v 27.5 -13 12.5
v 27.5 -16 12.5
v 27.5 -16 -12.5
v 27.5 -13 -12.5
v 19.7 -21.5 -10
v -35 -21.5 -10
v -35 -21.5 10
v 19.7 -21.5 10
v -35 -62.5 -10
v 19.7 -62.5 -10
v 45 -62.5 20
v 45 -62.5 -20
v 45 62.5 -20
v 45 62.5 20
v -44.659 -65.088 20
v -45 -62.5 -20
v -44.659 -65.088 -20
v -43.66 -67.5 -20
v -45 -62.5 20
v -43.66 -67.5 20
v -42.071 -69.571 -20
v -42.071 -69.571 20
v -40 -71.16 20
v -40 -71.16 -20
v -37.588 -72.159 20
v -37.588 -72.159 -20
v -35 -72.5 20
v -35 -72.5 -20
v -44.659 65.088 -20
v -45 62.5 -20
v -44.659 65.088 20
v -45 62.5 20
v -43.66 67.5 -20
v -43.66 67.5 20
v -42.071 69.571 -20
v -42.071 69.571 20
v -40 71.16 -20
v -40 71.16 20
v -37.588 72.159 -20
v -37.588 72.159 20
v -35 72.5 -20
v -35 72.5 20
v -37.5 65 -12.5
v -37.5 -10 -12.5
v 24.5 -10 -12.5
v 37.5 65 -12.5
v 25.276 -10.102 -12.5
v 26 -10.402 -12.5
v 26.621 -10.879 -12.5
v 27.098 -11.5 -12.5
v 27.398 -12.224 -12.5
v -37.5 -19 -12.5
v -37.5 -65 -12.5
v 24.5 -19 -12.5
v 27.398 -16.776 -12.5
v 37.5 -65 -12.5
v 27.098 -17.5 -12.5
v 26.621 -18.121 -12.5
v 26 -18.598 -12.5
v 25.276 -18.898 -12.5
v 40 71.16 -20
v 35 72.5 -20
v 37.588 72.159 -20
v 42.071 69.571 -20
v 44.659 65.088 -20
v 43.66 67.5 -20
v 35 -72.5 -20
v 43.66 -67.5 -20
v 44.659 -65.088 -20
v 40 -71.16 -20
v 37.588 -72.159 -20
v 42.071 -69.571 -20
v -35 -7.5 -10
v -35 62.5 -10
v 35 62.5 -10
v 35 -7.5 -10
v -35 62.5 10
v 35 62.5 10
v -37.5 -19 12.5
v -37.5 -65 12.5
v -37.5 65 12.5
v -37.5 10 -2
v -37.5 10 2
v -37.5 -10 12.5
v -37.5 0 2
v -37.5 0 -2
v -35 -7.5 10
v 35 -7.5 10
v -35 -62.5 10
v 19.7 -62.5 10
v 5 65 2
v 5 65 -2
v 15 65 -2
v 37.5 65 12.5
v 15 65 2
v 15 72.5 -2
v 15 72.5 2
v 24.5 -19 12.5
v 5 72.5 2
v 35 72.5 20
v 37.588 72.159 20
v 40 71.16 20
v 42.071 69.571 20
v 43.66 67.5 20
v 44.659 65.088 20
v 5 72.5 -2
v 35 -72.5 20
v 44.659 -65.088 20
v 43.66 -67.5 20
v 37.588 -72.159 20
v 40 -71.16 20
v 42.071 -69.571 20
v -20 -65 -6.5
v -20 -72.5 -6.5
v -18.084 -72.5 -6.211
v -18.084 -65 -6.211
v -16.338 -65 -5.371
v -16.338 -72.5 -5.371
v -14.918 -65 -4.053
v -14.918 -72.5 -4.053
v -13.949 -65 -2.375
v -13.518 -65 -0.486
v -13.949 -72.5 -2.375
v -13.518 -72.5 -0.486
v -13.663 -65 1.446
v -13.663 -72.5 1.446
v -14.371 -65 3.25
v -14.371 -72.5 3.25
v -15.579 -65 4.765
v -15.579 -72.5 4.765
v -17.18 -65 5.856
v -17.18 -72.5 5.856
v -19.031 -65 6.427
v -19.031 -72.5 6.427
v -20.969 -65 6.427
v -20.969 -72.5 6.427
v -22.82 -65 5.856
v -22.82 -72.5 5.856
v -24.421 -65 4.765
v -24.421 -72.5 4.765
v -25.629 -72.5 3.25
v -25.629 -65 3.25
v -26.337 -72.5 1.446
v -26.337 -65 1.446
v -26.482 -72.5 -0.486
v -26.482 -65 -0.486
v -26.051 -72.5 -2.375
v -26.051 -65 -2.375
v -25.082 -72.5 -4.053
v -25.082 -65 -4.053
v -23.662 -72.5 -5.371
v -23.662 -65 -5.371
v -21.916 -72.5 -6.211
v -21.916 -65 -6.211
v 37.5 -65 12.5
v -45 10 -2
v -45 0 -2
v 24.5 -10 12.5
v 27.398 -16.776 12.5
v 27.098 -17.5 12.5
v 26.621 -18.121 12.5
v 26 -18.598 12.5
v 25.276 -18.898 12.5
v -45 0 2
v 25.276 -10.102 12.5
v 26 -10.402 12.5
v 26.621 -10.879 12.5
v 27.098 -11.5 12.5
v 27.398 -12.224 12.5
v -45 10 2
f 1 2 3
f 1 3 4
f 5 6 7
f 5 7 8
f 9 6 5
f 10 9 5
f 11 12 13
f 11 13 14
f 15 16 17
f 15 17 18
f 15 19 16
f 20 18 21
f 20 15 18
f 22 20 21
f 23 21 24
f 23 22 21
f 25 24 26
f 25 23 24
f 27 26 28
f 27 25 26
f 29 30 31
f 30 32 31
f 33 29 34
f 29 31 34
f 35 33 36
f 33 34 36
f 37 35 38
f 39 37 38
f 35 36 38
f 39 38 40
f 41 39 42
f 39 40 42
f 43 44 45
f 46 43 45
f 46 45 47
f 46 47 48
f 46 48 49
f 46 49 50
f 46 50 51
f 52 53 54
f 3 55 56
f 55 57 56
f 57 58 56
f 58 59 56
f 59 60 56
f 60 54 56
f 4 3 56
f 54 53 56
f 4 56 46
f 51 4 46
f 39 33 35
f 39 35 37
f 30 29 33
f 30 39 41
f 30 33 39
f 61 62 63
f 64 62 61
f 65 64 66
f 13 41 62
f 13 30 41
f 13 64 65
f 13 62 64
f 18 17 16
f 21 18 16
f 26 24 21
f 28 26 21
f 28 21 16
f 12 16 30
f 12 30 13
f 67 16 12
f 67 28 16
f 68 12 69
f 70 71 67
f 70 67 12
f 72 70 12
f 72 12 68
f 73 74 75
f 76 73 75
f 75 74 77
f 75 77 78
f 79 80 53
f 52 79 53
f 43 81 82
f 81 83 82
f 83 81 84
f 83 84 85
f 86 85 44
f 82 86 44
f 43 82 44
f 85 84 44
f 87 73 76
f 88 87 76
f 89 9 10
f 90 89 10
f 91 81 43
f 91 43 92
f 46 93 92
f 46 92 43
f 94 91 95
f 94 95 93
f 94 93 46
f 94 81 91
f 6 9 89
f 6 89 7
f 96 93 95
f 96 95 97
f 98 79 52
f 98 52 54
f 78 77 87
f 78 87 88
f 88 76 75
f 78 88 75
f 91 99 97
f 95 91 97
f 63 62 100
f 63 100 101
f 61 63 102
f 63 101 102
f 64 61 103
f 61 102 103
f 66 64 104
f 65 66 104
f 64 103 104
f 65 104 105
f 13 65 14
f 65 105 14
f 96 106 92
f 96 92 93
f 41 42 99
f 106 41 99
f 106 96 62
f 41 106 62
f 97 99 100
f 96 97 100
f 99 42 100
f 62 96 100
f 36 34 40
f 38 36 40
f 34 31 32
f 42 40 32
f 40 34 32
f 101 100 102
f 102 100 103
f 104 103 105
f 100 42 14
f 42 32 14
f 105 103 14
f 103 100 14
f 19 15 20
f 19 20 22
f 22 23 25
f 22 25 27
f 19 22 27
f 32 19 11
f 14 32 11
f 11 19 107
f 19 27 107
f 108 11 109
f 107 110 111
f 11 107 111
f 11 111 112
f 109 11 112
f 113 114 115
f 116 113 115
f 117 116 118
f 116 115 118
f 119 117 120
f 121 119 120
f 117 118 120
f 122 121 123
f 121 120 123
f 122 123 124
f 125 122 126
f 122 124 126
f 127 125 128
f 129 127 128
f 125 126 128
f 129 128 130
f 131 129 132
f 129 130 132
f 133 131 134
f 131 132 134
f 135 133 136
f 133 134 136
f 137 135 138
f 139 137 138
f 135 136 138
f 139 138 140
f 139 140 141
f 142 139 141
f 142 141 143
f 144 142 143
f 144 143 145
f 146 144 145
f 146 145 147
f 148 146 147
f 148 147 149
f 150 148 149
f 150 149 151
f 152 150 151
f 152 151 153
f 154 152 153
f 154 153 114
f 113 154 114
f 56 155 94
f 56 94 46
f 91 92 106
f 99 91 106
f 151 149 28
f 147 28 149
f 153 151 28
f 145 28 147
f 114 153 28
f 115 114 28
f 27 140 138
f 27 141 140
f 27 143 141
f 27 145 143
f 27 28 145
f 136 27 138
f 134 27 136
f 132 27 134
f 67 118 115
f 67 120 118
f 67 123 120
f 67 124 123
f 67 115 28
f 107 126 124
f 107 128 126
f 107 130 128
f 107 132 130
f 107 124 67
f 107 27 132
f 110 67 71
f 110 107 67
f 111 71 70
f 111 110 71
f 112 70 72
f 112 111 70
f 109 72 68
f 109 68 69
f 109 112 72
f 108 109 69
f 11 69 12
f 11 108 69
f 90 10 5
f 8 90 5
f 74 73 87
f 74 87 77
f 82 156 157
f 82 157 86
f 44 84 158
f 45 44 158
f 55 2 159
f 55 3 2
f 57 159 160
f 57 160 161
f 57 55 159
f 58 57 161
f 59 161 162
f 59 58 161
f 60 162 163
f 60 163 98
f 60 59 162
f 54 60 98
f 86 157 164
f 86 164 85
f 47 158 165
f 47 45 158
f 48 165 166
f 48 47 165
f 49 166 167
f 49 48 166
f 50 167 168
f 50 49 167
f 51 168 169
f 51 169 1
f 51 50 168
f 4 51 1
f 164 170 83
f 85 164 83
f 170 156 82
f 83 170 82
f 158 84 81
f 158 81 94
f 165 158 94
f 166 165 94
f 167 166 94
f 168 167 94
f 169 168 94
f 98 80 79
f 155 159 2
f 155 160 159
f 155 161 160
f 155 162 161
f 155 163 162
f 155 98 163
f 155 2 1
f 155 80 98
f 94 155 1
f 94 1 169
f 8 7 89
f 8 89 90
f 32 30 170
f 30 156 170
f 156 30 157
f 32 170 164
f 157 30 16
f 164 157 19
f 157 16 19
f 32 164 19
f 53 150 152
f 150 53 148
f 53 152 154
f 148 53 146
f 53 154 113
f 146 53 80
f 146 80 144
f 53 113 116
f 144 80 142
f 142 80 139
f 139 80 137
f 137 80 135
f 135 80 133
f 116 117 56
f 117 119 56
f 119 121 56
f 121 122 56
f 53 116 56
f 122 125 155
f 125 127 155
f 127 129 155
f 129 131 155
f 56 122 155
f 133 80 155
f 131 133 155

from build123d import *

# Parameters (mm, degrees)
BOSS_EXTRUDE2_DEPTH             = 65
BOSS_EXTRUDE2_DEPTH_BACK        = 65
SKETCH1_W                       = 90
SKETCH1_H                       = 40
SKETCH1_W_2                     = 75
SKETCH1_H_2                     = 25
SKETCH2_W                       = 90
SKETCH2_H                       = 40
BOSS_EXTRUDE3_DEPTH             = 7.5
CUT_EXTRUDE1_REACH              = 155.134
SKETCH3_R                       = 6.5
BOSS_EXTRUDE4_DEPTH             = 10
BOSS_EXTRUDE4_DEPTH_BACK        = 10
SKETCH6_W                       = 70
SKETCH6_H                       = 70
BOSS_EXTRUDE4_2_DEPTH           = 10
BOSS_EXTRUDE4_2_DEPTH_BACK      = 10
SKETCH6_W_2                     = 54.7
SKETCH6_H_2                     = 41
BOSS_EXTRUDE5_REACH             = 89.643
SKETCH7_W                       = 65
SKETCH7_H                       = 9
BOSS_EXTRUDE5_DIRECTION_2_REACH = 89.643
CUT_EXTRUDE2_DEPTH              = 2
CUT_EXTRUDE2_DEPTH_BACK         = 2
SKETCH9_W                       = 10
SKETCH9_H                       = 7.5
SKETCH9_W_2                     = 7.5
SKETCH9_H_2                     = 10
FILLET1_R                       = 10
FILLET2_R                       = 3


with BuildPart() as part:
    # Sketch1 → Boss-Extrude2 (new, two sides: drawn at the far end of the back side and taken through both)
    with BuildSketch(Plane(origin=(0, 0, 0), x_dir=(1, 0, 0), z_dir=(0, 1, 0)).offset(-BOSS_EXTRUDE2_DEPTH_BACK)):
        Rectangle(SKETCH1_W, SKETCH1_H)
        Rectangle(SKETCH1_W_2, SKETCH1_H_2, mode=Mode.SUBTRACT)
    extrude(amount=BOSS_EXTRUDE2_DEPTH + BOSS_EXTRUDE2_DEPTH_BACK)

    # Sketch2 → Boss-Extrude3 (add)
    with BuildSketch(Plane.XZ.offset(65)):
        Rectangle(SKETCH2_W, SKETCH2_H)
    boss_extrude3 = extrude(amount=BOSS_EXTRUDE3_DEPTH)

    # Mirror1: Boss-Extrude3 across plane
    add(boss_extrude3.mirror(Plane.ZX))

    # Sketch3 → Cut-Extrude1 (cut, up to next)
    with BuildSketch(Plane.XZ.offset(72.5), mode=Mode.PRIVATE) as cut_extrude1_sk1:
        with Locations((-20, 0)):
            Circle(SKETCH3_R)
    cut_extrude1_tool1 = extrude(cut_extrude1_sk1.sketch, amount=-CUT_EXTRUDE1_REACH, mode=Mode.PRIVATE) & part.part
    add(cut_extrude1_tool1.solids().sort_by_distance((-20, -72.5, 0))[0], mode=Mode.SUBTRACT)

    # Sketch7 → Boss-Extrude5 (add, up to next)
    with BuildSketch(Plane.XY, mode=Mode.PRIVATE) as boss_extrude5_sk1:
        with Locations((-5, -14.5)):
            Rectangle(SKETCH7_W, SKETCH7_H)
    boss_extrude5_tool1 = extrude(boss_extrude5_sk1.sketch, amount=BOSS_EXTRUDE5_REACH, mode=Mode.PRIVATE) - part.part
    add(boss_extrude5_tool1.solids().sort_by_distance((-5, -14.5, 0))[0])

    # Sketch7 → Boss-Extrude5 direction 2 (add, up to next)
    with BuildSketch(Plane.XY, mode=Mode.PRIVATE) as boss_extrude5_direction_2_sk1:
        with Locations((-5, -14.5)):
            Rectangle(SKETCH7_W, SKETCH7_H)
    boss_extrude5_direction_2_tool1 = extrude(boss_extrude5_direction_2_sk1.sketch, amount=-BOSS_EXTRUDE5_DIRECTION_2_REACH, mode=Mode.PRIVATE) - part.part
    add(boss_extrude5_direction_2_tool1.solids().sort_by_distance((-5, -14.5, 0))[0])

    # Sketch9 → Cut-Extrude2 (cut, two sides: drawn at the far end of the back side and taken through both)
    with BuildSketch(Plane.XY.offset(-CUT_EXTRUDE2_DEPTH_BACK)):
        with Locations((10, 68.75)):
            Rectangle(SKETCH9_W, SKETCH9_H)
        with Locations((-41.25, 5)):
            Rectangle(SKETCH9_W_2, SKETCH9_H_2)
    extrude(amount=CUT_EXTRUDE2_DEPTH + CUT_EXTRUDE2_DEPTH_BACK, mode=Mode.SUBTRACT)

    # Fillet1
    fillet1_edges = [part.edges().sort_by_distance(p)[0] for p in [
        (-45, 72.5, 0),
        (-45, -72.5, 0),
        (45, -72.5, 0),
        (45, 72.5, 0),
    ]]
    fillet(fillet1_edges, radius=FILLET1_R)

    # Fillet2
    fillet2_edges = [part.edges().sort_by_distance(p)[0] for p in [
        (27.5, -19, 0),
        (27.5, -10, 0),
    ]]
    fillet(fillet2_edges, radius=FILLET2_R)


with BuildPart() as body_2:
    # Sketch6 → Boss-Extrude4 (new, two sides: drawn at the far end of the back side and taken through both)
    with BuildSketch(Plane.XY.offset(-BOSS_EXTRUDE4_DEPTH_BACK)):
        with Locations((0, 27.5)):
            Rectangle(SKETCH6_W, SKETCH6_H)
    extrude(amount=BOSS_EXTRUDE4_DEPTH + BOSS_EXTRUDE4_DEPTH_BACK)


with BuildPart() as body_3:
    # Sketch6 → Boss-Extrude4 2 (new, two sides: drawn at the far end of the back side and taken through both)
    with BuildSketch(Plane.XY.offset(-BOSS_EXTRUDE4_2_DEPTH_BACK)):
        with Locations((-7.65, -42)):
            Rectangle(SKETCH6_W_2, SKETCH6_H_2)
    extrude(amount=BOSS_EXTRUDE4_2_DEPTH + BOSS_EXTRUDE4_2_DEPTH_BACK)


solid = Compound([part.part, body_2.part, body_3.part])
